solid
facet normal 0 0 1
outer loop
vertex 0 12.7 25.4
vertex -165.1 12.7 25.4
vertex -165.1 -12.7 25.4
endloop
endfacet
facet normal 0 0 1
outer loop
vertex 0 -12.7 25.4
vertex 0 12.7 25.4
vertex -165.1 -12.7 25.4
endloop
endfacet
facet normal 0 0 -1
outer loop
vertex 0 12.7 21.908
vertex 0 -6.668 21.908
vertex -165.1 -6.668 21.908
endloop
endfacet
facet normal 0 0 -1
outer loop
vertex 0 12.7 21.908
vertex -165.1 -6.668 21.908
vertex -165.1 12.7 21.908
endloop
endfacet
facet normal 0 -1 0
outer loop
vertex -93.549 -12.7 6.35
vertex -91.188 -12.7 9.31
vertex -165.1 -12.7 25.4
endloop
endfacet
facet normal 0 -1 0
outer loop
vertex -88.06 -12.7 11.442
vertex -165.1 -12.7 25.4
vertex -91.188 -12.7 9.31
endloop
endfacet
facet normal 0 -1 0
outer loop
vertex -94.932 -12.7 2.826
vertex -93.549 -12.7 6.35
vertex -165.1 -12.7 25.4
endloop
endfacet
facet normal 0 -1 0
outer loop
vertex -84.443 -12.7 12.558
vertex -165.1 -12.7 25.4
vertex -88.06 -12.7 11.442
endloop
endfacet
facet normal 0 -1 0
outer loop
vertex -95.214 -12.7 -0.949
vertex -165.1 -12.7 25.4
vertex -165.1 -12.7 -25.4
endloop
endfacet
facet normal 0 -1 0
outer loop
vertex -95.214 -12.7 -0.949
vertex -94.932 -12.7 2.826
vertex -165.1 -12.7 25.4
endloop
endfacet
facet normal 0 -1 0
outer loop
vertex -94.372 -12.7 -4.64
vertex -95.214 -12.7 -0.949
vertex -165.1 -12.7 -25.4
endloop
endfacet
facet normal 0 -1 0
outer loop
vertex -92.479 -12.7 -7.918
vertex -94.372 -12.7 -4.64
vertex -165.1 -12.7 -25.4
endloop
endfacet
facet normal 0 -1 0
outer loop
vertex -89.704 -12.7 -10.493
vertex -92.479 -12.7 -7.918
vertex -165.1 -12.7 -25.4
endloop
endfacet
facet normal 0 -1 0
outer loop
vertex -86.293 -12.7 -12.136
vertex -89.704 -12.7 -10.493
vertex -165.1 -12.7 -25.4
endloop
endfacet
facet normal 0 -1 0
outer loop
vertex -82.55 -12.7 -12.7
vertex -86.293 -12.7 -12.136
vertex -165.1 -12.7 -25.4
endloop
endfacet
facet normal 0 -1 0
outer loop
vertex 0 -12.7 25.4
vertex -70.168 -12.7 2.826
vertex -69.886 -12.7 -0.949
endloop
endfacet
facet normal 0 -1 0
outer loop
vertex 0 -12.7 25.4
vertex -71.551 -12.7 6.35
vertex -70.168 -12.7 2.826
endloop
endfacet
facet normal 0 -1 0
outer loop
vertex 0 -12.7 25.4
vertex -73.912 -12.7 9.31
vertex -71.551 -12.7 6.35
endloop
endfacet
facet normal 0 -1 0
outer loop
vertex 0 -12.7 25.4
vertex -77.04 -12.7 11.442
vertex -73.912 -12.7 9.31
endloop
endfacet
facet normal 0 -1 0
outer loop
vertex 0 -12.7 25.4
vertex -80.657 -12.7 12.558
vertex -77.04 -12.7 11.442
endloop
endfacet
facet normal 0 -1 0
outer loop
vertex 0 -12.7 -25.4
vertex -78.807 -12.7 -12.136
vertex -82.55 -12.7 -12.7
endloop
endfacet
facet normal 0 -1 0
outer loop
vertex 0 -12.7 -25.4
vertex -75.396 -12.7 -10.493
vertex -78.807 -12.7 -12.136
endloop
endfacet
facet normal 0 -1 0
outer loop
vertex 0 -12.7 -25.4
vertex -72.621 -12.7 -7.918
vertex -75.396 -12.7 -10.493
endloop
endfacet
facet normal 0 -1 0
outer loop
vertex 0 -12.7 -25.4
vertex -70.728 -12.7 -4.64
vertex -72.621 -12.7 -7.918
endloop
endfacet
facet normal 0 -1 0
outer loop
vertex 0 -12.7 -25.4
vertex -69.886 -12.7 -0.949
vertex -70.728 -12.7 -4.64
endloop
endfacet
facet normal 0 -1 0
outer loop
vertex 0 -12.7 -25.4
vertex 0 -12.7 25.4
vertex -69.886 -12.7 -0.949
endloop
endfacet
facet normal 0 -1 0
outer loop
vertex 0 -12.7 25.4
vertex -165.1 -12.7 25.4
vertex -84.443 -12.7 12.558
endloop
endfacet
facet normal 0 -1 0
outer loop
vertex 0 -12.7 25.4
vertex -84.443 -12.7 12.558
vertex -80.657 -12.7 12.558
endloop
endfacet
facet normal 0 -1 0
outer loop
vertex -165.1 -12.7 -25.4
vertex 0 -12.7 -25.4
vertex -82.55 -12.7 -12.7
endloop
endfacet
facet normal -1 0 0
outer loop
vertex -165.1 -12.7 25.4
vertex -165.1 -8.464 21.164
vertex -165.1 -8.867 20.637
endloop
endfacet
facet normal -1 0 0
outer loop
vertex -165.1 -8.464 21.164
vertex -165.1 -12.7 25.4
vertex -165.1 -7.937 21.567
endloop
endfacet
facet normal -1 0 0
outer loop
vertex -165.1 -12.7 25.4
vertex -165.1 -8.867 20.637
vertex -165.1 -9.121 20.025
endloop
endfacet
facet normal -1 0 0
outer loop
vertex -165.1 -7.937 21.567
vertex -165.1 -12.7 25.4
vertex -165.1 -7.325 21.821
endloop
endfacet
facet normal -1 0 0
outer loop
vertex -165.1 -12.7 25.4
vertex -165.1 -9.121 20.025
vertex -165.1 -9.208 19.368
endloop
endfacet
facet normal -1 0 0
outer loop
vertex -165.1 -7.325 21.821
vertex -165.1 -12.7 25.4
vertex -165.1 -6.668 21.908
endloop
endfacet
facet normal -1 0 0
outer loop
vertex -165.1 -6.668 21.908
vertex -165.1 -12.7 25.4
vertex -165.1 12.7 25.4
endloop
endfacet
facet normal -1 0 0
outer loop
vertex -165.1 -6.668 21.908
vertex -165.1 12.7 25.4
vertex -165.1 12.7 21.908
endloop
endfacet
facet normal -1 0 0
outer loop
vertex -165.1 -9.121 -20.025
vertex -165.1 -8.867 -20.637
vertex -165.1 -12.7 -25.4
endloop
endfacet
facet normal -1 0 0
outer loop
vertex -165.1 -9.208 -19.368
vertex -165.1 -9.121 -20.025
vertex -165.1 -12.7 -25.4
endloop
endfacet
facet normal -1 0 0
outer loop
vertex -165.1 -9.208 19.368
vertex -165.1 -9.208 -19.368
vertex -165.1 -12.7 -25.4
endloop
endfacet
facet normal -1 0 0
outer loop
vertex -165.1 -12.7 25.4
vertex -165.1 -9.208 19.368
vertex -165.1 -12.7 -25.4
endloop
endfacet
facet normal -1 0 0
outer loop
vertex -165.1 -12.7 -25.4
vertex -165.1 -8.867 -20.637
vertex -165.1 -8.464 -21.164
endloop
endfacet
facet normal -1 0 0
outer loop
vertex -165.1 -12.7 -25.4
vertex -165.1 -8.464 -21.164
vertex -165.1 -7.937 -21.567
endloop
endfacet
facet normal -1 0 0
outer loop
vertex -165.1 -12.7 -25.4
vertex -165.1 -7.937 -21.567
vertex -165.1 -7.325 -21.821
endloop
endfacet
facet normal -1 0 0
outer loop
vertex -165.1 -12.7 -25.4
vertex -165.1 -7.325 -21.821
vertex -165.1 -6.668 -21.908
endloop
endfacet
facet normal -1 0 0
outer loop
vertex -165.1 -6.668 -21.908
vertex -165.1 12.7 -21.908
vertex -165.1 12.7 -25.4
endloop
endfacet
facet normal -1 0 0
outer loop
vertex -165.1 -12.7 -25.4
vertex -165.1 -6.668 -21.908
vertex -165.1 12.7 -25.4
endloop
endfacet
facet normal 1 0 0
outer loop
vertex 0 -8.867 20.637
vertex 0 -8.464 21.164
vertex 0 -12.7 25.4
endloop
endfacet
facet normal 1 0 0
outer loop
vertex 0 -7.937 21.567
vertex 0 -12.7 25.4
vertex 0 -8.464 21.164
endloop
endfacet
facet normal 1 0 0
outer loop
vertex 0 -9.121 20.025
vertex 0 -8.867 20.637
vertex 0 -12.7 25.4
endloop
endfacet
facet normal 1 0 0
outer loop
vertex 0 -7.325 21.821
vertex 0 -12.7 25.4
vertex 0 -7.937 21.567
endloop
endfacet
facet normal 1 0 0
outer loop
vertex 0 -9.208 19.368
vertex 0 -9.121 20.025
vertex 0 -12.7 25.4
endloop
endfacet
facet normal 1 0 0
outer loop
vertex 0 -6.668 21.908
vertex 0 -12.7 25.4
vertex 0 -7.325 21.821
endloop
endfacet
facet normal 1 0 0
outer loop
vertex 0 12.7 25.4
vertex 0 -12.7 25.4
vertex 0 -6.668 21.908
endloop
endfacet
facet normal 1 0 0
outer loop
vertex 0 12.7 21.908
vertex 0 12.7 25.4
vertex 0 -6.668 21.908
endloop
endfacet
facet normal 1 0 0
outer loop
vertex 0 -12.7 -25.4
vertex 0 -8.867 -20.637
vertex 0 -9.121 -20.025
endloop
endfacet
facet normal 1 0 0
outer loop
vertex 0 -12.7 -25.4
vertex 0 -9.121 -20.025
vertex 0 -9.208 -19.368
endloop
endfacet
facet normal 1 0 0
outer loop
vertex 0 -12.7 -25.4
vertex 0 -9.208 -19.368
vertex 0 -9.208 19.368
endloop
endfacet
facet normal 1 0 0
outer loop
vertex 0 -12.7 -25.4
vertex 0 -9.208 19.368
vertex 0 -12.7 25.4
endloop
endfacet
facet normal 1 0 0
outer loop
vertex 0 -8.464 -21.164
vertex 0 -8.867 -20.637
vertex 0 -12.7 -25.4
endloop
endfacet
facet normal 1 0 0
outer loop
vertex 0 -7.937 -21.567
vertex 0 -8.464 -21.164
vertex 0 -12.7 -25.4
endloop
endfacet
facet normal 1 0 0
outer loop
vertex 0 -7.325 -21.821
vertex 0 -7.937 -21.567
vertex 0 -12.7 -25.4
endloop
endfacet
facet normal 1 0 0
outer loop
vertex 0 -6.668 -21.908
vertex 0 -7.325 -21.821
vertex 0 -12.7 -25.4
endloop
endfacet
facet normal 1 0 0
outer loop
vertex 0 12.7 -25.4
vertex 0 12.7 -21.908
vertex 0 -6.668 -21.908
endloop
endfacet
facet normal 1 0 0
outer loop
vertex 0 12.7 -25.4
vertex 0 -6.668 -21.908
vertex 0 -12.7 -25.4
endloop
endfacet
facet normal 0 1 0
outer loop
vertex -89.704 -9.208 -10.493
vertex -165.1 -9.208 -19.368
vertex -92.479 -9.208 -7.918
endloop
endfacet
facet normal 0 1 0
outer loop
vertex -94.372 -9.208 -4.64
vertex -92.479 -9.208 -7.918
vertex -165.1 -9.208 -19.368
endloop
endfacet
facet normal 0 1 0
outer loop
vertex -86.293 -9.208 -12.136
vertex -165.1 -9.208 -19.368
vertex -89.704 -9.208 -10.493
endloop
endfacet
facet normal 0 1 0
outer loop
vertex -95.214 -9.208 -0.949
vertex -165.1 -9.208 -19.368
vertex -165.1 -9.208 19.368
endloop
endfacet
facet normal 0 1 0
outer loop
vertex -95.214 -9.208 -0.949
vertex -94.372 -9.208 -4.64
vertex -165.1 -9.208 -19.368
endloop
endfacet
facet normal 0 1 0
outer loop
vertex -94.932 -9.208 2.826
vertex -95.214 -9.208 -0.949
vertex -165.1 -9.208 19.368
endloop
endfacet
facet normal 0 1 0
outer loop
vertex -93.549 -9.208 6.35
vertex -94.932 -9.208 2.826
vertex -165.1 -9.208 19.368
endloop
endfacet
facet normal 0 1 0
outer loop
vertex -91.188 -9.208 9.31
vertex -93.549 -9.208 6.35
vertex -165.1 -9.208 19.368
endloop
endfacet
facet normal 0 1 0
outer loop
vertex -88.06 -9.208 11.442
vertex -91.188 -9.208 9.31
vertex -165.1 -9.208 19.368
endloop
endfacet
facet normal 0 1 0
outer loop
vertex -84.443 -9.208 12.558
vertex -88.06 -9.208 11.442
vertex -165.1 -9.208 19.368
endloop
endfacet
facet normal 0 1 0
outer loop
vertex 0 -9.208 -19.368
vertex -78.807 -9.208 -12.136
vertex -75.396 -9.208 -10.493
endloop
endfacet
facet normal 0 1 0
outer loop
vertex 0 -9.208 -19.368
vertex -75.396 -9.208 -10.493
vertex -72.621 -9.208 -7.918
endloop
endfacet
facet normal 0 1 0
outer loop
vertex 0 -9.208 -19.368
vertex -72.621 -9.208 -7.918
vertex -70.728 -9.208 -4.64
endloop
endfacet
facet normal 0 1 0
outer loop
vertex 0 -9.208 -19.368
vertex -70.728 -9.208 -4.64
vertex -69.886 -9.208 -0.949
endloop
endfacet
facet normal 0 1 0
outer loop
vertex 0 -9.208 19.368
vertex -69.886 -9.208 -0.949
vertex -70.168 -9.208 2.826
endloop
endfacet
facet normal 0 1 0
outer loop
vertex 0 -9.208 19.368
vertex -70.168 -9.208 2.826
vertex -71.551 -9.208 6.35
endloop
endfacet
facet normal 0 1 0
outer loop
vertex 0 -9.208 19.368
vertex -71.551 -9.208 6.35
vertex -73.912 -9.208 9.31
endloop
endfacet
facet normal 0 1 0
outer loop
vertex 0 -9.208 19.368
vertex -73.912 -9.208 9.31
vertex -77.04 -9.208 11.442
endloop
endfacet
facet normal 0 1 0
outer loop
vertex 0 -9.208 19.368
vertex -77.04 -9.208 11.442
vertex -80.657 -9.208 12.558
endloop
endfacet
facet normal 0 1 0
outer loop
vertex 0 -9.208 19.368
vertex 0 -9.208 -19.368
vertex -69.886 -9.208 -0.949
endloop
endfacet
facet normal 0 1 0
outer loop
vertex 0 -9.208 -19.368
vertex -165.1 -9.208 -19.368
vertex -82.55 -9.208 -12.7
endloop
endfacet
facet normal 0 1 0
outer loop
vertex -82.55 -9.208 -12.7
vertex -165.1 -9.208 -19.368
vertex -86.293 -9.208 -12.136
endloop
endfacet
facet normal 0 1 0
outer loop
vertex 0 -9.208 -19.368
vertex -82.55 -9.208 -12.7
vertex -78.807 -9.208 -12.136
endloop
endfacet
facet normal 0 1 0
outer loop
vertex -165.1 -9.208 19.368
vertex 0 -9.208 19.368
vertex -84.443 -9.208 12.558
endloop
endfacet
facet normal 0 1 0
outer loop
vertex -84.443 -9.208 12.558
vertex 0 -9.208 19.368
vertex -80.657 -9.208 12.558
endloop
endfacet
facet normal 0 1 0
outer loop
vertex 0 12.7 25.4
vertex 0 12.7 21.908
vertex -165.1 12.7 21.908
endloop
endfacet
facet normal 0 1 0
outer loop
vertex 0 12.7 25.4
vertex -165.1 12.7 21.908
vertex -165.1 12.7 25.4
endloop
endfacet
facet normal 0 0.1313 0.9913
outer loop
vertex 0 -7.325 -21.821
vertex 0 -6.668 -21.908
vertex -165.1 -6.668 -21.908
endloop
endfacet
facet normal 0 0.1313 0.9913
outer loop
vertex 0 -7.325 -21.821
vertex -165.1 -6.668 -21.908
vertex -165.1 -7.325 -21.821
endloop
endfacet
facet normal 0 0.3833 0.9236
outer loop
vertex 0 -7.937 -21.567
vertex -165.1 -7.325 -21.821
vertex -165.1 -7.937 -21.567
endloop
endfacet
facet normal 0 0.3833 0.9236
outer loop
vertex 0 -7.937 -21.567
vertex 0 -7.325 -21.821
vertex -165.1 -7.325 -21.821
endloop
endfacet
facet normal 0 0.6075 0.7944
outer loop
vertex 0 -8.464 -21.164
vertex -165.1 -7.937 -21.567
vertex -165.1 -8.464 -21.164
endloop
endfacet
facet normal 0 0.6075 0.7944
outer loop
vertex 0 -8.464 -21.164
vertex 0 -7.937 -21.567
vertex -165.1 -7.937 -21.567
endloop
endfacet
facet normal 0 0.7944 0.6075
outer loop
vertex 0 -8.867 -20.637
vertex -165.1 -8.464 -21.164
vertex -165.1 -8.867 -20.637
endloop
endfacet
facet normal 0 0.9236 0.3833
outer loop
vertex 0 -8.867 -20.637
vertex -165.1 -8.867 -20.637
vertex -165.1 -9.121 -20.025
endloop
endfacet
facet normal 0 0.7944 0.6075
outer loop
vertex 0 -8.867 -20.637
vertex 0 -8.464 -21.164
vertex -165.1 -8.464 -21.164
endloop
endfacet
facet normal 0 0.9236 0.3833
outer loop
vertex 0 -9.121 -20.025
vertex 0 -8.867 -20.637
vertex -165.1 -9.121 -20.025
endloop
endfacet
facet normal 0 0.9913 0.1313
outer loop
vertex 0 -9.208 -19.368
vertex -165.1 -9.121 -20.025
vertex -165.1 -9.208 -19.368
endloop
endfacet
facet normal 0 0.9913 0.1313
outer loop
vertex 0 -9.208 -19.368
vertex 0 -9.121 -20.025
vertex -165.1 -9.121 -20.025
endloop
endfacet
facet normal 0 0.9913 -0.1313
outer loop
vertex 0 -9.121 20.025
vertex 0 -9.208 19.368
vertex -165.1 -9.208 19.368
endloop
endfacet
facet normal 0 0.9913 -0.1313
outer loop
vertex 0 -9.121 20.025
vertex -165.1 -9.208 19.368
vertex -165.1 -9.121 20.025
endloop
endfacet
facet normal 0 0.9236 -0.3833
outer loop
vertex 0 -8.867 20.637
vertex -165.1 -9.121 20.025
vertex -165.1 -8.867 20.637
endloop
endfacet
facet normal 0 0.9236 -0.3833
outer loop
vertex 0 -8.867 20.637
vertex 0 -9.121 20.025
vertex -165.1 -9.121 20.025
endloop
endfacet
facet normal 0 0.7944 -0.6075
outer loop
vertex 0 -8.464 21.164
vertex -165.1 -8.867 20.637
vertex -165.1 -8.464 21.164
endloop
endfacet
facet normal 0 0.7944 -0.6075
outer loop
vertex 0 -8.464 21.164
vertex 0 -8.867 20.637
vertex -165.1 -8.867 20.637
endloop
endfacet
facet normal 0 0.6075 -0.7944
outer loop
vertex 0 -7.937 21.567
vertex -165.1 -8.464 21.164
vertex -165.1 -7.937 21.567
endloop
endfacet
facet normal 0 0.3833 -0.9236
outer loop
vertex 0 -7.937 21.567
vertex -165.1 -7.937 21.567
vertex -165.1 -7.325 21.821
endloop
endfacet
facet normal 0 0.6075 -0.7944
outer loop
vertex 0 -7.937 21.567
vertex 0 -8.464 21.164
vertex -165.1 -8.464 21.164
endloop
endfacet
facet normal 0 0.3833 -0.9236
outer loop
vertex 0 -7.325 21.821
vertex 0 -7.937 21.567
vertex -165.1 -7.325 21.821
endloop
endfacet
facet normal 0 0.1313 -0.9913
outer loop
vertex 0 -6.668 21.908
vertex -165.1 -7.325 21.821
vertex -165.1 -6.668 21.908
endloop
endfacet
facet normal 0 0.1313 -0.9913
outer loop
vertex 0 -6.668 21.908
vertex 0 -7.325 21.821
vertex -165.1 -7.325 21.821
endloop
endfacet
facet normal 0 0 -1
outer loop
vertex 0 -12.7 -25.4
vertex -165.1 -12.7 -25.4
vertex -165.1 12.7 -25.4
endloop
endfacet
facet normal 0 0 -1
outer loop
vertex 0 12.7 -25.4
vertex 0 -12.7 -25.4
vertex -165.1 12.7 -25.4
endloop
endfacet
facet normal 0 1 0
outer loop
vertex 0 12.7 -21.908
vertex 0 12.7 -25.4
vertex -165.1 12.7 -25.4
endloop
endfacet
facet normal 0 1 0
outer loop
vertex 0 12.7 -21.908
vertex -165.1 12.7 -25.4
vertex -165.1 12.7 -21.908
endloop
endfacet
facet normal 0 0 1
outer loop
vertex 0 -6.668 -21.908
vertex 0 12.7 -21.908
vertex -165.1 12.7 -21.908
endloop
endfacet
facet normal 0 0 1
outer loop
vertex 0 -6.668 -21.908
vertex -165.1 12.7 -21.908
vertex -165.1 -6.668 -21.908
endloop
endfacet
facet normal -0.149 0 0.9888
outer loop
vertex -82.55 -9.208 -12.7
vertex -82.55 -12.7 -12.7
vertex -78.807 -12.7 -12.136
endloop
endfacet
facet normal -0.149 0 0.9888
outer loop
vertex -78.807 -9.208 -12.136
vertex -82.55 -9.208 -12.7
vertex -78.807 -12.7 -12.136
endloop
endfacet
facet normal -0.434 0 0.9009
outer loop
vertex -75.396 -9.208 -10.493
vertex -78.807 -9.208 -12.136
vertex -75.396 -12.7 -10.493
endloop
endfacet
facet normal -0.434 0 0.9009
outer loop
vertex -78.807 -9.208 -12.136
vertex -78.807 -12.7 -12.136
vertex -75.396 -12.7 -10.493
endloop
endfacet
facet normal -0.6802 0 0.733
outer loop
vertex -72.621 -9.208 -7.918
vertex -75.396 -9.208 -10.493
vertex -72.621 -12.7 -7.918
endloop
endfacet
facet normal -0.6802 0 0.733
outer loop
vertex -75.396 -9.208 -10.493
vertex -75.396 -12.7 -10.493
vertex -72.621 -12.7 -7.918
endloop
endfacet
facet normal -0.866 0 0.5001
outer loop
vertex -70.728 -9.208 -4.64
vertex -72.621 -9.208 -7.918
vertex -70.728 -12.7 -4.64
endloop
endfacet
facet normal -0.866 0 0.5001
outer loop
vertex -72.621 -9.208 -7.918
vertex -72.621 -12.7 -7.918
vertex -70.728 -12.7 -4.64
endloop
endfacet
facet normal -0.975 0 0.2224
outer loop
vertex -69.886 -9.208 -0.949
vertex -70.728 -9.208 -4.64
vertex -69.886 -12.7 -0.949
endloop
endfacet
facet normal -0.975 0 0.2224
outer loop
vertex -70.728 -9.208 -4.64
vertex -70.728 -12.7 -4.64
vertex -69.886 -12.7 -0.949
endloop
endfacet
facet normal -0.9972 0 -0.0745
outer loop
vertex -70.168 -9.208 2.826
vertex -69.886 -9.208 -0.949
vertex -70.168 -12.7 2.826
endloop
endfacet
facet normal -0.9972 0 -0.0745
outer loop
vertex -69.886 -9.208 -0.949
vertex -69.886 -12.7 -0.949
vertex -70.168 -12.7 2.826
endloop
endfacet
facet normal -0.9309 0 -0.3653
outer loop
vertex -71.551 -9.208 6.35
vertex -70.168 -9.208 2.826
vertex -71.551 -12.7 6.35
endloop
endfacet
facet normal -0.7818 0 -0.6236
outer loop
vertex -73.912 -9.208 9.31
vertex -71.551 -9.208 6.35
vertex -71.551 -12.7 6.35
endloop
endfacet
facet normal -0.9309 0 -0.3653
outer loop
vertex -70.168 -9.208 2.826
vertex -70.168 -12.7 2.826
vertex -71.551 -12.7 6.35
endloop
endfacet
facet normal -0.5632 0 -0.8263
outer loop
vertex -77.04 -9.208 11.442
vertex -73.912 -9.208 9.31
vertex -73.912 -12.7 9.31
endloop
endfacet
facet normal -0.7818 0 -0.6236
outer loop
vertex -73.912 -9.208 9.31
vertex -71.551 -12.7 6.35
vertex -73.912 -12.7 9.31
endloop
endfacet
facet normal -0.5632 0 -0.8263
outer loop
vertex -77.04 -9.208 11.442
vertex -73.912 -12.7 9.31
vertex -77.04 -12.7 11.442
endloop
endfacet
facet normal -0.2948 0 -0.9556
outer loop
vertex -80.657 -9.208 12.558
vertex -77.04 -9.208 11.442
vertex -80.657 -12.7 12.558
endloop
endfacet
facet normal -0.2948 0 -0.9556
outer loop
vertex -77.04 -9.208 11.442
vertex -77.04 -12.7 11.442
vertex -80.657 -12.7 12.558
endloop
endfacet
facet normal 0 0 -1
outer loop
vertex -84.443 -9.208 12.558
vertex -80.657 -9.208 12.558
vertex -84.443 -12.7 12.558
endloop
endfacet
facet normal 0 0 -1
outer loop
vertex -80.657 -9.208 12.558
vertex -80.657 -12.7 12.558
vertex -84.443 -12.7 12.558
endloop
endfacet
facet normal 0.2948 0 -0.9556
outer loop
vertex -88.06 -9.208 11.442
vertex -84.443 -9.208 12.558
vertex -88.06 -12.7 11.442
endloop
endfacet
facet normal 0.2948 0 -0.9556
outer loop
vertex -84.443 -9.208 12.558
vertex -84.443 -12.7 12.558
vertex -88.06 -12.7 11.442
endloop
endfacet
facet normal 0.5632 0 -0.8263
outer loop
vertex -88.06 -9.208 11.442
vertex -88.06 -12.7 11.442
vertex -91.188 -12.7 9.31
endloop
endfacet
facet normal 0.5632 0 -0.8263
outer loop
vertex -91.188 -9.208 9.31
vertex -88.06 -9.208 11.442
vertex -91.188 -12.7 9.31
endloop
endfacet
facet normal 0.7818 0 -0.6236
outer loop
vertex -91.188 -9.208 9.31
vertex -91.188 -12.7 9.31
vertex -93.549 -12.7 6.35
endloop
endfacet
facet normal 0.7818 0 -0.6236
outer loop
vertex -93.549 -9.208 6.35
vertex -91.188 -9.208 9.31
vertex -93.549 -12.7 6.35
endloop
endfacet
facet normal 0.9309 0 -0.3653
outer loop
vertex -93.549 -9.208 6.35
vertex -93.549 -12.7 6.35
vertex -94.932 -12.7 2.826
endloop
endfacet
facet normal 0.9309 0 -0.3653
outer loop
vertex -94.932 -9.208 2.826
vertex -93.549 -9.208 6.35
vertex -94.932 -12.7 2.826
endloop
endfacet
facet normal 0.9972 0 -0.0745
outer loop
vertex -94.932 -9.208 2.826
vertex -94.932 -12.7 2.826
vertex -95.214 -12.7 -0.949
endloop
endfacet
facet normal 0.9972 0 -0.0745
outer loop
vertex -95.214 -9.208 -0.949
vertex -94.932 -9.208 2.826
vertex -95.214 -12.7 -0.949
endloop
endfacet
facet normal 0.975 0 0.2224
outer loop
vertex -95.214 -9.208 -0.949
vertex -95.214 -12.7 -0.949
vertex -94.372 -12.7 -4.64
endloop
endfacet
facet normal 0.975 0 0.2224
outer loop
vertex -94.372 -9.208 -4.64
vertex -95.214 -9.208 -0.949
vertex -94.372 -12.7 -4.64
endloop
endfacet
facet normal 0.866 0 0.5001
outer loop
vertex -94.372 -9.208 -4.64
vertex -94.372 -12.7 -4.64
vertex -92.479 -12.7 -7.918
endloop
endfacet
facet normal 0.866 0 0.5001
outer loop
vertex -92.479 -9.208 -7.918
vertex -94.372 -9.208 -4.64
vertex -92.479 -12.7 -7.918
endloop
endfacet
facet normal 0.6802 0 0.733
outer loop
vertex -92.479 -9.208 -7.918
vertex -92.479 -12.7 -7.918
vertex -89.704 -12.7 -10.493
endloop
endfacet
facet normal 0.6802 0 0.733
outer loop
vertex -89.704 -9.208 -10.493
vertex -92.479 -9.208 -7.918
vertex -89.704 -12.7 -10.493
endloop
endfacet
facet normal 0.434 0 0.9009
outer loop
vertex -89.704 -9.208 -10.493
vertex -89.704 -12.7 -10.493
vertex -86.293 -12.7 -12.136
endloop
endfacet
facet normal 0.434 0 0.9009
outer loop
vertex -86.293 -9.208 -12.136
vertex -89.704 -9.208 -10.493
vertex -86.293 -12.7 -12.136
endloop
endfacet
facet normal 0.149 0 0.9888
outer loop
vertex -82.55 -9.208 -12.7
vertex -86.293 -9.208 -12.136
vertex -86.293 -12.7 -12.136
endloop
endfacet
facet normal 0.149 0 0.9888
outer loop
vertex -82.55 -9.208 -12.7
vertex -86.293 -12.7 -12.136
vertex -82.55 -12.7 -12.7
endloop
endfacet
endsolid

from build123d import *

# Parameters (mm, degrees)
BOSS_EXTRUDE1_DEPTH = 165.1
SKETCH2_R           = 12.7
CUT_EXTRUDE1_DEPTH  = 11.938


with BuildPart() as part:
    # Sketch1 → Boss-Extrude1 (new body)
    with BuildSketch(Plane(origin=(0, 0, 0), x_dir=(0, 0, -1), z_dir=(1, 0, 0))):
        with BuildLine():
            Line((-21.9075, -6.6675), (-21.9075, 9.2075))
            Line((-21.9075, 9.2075), (-21.9075, 12.7))
            Line((-21.9075, 12.7), (-25.4, 12.7))
            Line((-25.4, 12.7), (-25.4, -12.7))
            Line((-25.4, -12.7), (25.4, -12.7))
            Line((25.4, -12.7), (25.4, 12.7))
            Line((25.4, 12.7), (21.9075, 12.7))
            Line((21.9075, 12.7), (21.9075, 9.2075))
            Line((21.9075, 9.2075), (21.9075, -6.6675))
            ThreePointArc((21.9075, -6.6675), (21.163551224, -8.463551224), (19.3675, -9.2075))
            Line((19.3675, -9.2075), (-19.3675, -9.2075))
            ThreePointArc((-19.3675, -9.2075), (-21.163551224, -8.463551224), (-21.9075, -6.6675))
        make_face()
    extrude(amount=-BOSS_EXTRUDE1_DEPTH)

    # Sketch2 → Cut-Extrude1 (cut)
    with BuildSketch(Plane.XZ.offset(12.7)):
        with Locations(Location((-82.55, 0, 0), (0, 0, 270))):
            Circle(SKETCH2_R)
    extrude(amount=-CUT_EXTRUDE1_DEPTH, mode=Mode.SUBTRACT)


solid = part.part
